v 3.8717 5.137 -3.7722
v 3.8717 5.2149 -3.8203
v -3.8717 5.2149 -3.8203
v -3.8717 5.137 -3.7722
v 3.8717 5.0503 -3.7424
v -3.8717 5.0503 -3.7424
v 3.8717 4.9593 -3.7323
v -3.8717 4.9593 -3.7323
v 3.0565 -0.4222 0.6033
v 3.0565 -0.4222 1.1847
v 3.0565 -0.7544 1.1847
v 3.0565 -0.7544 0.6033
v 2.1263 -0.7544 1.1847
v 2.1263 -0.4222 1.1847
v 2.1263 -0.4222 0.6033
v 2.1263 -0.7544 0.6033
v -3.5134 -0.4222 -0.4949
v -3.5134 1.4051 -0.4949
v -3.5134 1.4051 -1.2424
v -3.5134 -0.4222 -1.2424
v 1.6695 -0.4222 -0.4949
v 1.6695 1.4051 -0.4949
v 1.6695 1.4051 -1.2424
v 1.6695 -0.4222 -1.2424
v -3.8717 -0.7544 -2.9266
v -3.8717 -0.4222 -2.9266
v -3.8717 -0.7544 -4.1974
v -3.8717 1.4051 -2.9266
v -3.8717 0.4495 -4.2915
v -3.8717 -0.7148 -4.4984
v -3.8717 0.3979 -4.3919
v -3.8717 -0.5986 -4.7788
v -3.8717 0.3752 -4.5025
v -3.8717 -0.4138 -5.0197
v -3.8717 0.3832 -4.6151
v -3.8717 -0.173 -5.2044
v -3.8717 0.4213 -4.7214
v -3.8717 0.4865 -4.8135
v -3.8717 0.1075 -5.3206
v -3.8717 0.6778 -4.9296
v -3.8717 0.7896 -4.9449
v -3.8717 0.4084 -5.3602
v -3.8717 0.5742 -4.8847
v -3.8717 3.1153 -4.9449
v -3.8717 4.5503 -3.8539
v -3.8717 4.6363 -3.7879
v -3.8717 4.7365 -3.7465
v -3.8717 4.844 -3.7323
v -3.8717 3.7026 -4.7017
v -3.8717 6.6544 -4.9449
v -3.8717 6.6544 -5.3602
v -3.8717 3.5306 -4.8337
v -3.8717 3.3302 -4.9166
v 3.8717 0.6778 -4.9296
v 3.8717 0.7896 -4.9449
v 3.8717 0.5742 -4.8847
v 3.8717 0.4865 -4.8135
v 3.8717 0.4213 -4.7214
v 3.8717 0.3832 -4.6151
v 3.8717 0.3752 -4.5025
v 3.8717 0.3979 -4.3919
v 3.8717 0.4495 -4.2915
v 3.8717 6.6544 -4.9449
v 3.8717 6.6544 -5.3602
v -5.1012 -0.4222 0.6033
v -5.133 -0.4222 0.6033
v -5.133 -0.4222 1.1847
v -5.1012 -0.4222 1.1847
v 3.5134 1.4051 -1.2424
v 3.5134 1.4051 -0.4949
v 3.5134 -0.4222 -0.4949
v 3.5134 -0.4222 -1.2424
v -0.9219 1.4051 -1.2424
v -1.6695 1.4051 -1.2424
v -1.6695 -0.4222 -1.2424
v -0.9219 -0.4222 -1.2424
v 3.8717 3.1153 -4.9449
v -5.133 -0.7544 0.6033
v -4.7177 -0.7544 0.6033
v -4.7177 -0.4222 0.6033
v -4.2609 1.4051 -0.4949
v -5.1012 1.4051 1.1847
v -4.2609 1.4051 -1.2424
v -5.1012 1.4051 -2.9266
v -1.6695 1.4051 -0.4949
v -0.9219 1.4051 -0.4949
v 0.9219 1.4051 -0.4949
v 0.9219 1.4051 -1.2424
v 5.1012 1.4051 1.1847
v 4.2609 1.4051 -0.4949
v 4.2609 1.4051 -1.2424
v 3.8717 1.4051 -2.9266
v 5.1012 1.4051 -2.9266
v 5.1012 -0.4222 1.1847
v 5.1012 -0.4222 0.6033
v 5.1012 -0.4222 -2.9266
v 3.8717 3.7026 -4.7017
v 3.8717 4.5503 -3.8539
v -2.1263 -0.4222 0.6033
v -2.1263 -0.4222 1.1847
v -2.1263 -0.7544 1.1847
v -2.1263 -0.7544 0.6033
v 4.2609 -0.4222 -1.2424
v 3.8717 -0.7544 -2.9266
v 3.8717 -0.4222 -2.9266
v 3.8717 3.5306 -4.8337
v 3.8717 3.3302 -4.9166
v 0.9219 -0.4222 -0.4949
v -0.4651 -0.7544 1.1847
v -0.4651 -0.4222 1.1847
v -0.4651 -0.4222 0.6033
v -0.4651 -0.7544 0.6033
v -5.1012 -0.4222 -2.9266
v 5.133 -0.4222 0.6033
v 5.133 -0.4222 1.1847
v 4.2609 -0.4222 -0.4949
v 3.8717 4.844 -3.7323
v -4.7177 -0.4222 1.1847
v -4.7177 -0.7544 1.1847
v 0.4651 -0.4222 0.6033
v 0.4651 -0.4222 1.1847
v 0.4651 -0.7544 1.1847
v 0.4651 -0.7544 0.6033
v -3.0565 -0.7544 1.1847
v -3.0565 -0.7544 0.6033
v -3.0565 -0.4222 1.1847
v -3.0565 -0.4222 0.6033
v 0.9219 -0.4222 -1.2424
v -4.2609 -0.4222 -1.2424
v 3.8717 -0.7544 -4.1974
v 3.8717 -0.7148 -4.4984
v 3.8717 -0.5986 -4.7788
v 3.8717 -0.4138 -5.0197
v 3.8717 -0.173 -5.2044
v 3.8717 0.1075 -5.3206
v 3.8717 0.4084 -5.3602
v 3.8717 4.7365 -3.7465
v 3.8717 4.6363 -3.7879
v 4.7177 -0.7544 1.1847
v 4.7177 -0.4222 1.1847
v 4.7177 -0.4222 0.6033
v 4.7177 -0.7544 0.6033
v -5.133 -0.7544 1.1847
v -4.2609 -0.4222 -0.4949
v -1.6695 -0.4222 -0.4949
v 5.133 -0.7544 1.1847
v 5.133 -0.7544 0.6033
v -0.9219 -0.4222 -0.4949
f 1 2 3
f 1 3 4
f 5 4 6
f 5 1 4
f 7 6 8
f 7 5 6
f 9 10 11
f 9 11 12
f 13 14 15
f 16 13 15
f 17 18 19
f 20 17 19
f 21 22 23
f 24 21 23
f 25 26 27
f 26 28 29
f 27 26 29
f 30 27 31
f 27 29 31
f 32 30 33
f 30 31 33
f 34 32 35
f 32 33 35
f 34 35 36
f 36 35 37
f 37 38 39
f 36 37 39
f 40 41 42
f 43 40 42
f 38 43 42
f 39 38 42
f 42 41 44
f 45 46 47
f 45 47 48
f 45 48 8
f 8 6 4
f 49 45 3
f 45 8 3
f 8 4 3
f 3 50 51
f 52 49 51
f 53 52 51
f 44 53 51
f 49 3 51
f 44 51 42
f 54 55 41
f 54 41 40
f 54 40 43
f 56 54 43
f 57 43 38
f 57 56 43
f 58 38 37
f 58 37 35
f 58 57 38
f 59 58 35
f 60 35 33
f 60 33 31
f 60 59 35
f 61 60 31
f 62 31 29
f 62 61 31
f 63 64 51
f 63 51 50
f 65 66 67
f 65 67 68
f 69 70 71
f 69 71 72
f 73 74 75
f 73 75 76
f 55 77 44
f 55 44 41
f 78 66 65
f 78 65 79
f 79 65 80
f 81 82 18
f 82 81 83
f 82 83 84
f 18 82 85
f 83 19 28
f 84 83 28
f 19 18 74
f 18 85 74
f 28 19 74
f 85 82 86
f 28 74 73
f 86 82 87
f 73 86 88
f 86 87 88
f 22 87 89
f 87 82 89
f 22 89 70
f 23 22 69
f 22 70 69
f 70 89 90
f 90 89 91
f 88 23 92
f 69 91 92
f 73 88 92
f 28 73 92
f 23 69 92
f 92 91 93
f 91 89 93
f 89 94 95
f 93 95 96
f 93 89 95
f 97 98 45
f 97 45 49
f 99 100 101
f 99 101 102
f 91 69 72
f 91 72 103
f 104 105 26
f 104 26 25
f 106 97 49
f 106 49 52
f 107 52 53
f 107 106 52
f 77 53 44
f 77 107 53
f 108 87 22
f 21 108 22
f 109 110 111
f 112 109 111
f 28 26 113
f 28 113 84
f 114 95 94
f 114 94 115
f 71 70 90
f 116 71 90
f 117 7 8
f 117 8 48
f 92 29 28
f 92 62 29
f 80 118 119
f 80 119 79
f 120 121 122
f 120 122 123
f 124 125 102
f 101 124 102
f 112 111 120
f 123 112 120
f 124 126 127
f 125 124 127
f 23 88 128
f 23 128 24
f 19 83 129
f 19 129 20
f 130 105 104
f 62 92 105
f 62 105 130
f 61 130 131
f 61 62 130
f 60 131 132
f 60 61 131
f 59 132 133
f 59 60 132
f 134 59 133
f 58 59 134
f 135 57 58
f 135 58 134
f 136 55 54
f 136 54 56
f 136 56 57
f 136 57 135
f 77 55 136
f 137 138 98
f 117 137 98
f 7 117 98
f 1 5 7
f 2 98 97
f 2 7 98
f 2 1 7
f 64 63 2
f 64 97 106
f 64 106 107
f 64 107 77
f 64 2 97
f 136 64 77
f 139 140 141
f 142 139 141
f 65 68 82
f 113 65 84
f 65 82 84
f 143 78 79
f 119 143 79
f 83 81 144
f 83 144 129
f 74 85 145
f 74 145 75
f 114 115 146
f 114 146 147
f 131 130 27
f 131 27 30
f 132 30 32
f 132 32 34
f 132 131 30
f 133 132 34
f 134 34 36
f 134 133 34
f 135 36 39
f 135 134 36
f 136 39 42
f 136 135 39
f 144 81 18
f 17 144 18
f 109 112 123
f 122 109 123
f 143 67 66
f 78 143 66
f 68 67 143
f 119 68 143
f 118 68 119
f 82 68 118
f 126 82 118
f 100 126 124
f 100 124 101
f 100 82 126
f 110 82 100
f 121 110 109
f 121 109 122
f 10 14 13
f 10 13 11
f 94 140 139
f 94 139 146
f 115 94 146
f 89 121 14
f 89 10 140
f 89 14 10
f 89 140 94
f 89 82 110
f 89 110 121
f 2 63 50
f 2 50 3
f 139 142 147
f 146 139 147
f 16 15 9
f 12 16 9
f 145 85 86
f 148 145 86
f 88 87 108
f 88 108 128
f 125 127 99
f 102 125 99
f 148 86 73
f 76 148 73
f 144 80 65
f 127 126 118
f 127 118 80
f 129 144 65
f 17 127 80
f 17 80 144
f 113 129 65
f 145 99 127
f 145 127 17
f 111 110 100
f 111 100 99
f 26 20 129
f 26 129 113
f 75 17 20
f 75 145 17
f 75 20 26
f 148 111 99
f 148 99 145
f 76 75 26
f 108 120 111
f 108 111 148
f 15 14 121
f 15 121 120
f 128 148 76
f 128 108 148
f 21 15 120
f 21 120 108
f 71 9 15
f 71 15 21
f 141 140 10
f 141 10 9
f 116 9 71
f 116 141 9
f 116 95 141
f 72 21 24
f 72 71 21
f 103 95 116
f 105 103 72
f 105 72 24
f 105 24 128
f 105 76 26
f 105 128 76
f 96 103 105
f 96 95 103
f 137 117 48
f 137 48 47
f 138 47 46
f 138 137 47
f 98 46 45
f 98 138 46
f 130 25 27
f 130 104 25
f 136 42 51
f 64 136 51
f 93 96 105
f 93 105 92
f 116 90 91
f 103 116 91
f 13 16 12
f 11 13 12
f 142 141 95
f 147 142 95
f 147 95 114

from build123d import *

# Parameters (mm, degrees)
SKETCH51_W           = 6.2865
SKETCH51_H           = 2.794
BOSS_EXTRUDE23_DEPTH = 7.8
SKETCH49_W           = 1.143
SKETCH49_H           = 1.143
CUT_EXTRUDE22_DEPTH  = 9.861515478
BOSS_EXTRUDE24_DEPTH = 5.92
SKETCH52_W           = 0.635
SKETCH52_H           = 0.889
SKETCH52_W_2         = 1.4224
BOSS_EXTRUDE25_DEPTH = 0.508
SCALE1_SCALE         = 0.654


with BuildPart() as part:
    # Sketch51 → Boss-Extrude23 (new, symmetric)
    with BuildSketch(Plane(origin=(0, 0, 0), x_dir=(0, 0, -1), z_dir=(1, 0, 0))):
        Rectangle(SKETCH51_W, SKETCH51_H)
    extrude(amount=BOSS_EXTRUDE23_DEPTH, both=True)

    # Sketch49 → Cut-Extrude22 (cut, through all)
    with BuildSketch(Plane(origin=(0, 1.397, 0), x_dir=(1, 0, 0), z_dir=(0, 1, 0))):
        with Locations((1.9812, -0.003489448)):
            Rectangle(SKETCH49_W, SKETCH49_H)
        with Locations((5.9436, -0.003489448)):
            Rectangle(SKETCH49_W, SKETCH49_H)
        with Locations((-1.9812, -0.003489448)):
            Rectangle(SKETCH49_W, SKETCH49_H)
        with Locations((-5.9436, -0.003489448)):
            Rectangle(SKETCH49_W, SKETCH49_H)
    extrude(amount=-CUT_EXTRUDE22_DEPTH, mode=Mode.SUBTRACT)

    # Sketch50 → Boss-Extrude24 (add, symmetric)
    with BuildSketch(Plane(origin=(0, 0, 0), x_dir=(0, 0, -1), z_dir=(1, 0, 0))):
        with BuildLine():
            Line((3.14325, -1.905), (5.08635, -1.905))
            ThreePointArc((5.08635, -1.905), (6.343585857, -1.384235857), (6.86435, -0.127))
            Line((6.86435, -0.127), (6.86435, 9.4234))
            Line((6.86435, 9.4234), (6.22935, 9.4234))
            Line((6.22935, 9.4234), (4.509763171, 7.222429228))
            ThreePointArc((4.509763171, 7.222429228), (4.409745704, 7.038219969), (4.37515, 6.831484191))
            Line((4.37515, 6.831484191), (4.37515, 6.655190003))
            ThreePointArc((4.37515, 6.655190003), (4.423486497, 6.412186024), (4.561137194, 6.206177197))
            Line((4.561137194, 6.206177197), (5.857375612, 4.909938779))
            ThreePointArc((5.857375612, 4.909938779), (6.132677006, 4.497921126), (6.22935, 4.011913167))
            Line((6.22935, 4.011913167), (6.22935, 0.455913167))
            ThreePointArc((6.22935, 0.455913167), (5.887560369, -0.107338712), (5.230128963, -0.064248381))
            Line((5.230128963, -0.064248381), (3.14325, 1.397))
            Line((3.14325, 1.397), (3.14325, -1.905))
        make_face()
    extrude(amount=BOSS_EXTRUDE24_DEPTH, both=True)

    # Sketch52 → Boss-Extrude25 (add)
    with BuildSketch(Plane(origin=(0, -1.397, 0), x_dir=(1, 0, 0), z_dir=(0, 1, 0))):
        with Locations((7.5311, -2.69875)):
            Rectangle(SKETCH52_W, SKETCH52_H)
        with Locations((0, -2.69875)):
            Rectangle(SKETCH52_W_2, SKETCH52_H)
        with Locations((3.9624, -2.69875)):
            Rectangle(SKETCH52_W_2, SKETCH52_H)
        with Locations((-3.9624, -2.69875)):
            Rectangle(SKETCH52_W_2, SKETCH52_H)
        with Locations((-7.5311, -2.69875)):
            Rectangle(SKETCH52_W, SKETCH52_H)
    extrude(amount=-BOSS_EXTRUDE25_DEPTH)


with BuildPart() as part_1:
    # Scale1: scaled about (0, 1.420456249, -2.517201016)
    add(part.part.scale(SCALE1_SCALE).moved(Location((0, 0.491477862, -0.870951552))))


solid = part_1.part
